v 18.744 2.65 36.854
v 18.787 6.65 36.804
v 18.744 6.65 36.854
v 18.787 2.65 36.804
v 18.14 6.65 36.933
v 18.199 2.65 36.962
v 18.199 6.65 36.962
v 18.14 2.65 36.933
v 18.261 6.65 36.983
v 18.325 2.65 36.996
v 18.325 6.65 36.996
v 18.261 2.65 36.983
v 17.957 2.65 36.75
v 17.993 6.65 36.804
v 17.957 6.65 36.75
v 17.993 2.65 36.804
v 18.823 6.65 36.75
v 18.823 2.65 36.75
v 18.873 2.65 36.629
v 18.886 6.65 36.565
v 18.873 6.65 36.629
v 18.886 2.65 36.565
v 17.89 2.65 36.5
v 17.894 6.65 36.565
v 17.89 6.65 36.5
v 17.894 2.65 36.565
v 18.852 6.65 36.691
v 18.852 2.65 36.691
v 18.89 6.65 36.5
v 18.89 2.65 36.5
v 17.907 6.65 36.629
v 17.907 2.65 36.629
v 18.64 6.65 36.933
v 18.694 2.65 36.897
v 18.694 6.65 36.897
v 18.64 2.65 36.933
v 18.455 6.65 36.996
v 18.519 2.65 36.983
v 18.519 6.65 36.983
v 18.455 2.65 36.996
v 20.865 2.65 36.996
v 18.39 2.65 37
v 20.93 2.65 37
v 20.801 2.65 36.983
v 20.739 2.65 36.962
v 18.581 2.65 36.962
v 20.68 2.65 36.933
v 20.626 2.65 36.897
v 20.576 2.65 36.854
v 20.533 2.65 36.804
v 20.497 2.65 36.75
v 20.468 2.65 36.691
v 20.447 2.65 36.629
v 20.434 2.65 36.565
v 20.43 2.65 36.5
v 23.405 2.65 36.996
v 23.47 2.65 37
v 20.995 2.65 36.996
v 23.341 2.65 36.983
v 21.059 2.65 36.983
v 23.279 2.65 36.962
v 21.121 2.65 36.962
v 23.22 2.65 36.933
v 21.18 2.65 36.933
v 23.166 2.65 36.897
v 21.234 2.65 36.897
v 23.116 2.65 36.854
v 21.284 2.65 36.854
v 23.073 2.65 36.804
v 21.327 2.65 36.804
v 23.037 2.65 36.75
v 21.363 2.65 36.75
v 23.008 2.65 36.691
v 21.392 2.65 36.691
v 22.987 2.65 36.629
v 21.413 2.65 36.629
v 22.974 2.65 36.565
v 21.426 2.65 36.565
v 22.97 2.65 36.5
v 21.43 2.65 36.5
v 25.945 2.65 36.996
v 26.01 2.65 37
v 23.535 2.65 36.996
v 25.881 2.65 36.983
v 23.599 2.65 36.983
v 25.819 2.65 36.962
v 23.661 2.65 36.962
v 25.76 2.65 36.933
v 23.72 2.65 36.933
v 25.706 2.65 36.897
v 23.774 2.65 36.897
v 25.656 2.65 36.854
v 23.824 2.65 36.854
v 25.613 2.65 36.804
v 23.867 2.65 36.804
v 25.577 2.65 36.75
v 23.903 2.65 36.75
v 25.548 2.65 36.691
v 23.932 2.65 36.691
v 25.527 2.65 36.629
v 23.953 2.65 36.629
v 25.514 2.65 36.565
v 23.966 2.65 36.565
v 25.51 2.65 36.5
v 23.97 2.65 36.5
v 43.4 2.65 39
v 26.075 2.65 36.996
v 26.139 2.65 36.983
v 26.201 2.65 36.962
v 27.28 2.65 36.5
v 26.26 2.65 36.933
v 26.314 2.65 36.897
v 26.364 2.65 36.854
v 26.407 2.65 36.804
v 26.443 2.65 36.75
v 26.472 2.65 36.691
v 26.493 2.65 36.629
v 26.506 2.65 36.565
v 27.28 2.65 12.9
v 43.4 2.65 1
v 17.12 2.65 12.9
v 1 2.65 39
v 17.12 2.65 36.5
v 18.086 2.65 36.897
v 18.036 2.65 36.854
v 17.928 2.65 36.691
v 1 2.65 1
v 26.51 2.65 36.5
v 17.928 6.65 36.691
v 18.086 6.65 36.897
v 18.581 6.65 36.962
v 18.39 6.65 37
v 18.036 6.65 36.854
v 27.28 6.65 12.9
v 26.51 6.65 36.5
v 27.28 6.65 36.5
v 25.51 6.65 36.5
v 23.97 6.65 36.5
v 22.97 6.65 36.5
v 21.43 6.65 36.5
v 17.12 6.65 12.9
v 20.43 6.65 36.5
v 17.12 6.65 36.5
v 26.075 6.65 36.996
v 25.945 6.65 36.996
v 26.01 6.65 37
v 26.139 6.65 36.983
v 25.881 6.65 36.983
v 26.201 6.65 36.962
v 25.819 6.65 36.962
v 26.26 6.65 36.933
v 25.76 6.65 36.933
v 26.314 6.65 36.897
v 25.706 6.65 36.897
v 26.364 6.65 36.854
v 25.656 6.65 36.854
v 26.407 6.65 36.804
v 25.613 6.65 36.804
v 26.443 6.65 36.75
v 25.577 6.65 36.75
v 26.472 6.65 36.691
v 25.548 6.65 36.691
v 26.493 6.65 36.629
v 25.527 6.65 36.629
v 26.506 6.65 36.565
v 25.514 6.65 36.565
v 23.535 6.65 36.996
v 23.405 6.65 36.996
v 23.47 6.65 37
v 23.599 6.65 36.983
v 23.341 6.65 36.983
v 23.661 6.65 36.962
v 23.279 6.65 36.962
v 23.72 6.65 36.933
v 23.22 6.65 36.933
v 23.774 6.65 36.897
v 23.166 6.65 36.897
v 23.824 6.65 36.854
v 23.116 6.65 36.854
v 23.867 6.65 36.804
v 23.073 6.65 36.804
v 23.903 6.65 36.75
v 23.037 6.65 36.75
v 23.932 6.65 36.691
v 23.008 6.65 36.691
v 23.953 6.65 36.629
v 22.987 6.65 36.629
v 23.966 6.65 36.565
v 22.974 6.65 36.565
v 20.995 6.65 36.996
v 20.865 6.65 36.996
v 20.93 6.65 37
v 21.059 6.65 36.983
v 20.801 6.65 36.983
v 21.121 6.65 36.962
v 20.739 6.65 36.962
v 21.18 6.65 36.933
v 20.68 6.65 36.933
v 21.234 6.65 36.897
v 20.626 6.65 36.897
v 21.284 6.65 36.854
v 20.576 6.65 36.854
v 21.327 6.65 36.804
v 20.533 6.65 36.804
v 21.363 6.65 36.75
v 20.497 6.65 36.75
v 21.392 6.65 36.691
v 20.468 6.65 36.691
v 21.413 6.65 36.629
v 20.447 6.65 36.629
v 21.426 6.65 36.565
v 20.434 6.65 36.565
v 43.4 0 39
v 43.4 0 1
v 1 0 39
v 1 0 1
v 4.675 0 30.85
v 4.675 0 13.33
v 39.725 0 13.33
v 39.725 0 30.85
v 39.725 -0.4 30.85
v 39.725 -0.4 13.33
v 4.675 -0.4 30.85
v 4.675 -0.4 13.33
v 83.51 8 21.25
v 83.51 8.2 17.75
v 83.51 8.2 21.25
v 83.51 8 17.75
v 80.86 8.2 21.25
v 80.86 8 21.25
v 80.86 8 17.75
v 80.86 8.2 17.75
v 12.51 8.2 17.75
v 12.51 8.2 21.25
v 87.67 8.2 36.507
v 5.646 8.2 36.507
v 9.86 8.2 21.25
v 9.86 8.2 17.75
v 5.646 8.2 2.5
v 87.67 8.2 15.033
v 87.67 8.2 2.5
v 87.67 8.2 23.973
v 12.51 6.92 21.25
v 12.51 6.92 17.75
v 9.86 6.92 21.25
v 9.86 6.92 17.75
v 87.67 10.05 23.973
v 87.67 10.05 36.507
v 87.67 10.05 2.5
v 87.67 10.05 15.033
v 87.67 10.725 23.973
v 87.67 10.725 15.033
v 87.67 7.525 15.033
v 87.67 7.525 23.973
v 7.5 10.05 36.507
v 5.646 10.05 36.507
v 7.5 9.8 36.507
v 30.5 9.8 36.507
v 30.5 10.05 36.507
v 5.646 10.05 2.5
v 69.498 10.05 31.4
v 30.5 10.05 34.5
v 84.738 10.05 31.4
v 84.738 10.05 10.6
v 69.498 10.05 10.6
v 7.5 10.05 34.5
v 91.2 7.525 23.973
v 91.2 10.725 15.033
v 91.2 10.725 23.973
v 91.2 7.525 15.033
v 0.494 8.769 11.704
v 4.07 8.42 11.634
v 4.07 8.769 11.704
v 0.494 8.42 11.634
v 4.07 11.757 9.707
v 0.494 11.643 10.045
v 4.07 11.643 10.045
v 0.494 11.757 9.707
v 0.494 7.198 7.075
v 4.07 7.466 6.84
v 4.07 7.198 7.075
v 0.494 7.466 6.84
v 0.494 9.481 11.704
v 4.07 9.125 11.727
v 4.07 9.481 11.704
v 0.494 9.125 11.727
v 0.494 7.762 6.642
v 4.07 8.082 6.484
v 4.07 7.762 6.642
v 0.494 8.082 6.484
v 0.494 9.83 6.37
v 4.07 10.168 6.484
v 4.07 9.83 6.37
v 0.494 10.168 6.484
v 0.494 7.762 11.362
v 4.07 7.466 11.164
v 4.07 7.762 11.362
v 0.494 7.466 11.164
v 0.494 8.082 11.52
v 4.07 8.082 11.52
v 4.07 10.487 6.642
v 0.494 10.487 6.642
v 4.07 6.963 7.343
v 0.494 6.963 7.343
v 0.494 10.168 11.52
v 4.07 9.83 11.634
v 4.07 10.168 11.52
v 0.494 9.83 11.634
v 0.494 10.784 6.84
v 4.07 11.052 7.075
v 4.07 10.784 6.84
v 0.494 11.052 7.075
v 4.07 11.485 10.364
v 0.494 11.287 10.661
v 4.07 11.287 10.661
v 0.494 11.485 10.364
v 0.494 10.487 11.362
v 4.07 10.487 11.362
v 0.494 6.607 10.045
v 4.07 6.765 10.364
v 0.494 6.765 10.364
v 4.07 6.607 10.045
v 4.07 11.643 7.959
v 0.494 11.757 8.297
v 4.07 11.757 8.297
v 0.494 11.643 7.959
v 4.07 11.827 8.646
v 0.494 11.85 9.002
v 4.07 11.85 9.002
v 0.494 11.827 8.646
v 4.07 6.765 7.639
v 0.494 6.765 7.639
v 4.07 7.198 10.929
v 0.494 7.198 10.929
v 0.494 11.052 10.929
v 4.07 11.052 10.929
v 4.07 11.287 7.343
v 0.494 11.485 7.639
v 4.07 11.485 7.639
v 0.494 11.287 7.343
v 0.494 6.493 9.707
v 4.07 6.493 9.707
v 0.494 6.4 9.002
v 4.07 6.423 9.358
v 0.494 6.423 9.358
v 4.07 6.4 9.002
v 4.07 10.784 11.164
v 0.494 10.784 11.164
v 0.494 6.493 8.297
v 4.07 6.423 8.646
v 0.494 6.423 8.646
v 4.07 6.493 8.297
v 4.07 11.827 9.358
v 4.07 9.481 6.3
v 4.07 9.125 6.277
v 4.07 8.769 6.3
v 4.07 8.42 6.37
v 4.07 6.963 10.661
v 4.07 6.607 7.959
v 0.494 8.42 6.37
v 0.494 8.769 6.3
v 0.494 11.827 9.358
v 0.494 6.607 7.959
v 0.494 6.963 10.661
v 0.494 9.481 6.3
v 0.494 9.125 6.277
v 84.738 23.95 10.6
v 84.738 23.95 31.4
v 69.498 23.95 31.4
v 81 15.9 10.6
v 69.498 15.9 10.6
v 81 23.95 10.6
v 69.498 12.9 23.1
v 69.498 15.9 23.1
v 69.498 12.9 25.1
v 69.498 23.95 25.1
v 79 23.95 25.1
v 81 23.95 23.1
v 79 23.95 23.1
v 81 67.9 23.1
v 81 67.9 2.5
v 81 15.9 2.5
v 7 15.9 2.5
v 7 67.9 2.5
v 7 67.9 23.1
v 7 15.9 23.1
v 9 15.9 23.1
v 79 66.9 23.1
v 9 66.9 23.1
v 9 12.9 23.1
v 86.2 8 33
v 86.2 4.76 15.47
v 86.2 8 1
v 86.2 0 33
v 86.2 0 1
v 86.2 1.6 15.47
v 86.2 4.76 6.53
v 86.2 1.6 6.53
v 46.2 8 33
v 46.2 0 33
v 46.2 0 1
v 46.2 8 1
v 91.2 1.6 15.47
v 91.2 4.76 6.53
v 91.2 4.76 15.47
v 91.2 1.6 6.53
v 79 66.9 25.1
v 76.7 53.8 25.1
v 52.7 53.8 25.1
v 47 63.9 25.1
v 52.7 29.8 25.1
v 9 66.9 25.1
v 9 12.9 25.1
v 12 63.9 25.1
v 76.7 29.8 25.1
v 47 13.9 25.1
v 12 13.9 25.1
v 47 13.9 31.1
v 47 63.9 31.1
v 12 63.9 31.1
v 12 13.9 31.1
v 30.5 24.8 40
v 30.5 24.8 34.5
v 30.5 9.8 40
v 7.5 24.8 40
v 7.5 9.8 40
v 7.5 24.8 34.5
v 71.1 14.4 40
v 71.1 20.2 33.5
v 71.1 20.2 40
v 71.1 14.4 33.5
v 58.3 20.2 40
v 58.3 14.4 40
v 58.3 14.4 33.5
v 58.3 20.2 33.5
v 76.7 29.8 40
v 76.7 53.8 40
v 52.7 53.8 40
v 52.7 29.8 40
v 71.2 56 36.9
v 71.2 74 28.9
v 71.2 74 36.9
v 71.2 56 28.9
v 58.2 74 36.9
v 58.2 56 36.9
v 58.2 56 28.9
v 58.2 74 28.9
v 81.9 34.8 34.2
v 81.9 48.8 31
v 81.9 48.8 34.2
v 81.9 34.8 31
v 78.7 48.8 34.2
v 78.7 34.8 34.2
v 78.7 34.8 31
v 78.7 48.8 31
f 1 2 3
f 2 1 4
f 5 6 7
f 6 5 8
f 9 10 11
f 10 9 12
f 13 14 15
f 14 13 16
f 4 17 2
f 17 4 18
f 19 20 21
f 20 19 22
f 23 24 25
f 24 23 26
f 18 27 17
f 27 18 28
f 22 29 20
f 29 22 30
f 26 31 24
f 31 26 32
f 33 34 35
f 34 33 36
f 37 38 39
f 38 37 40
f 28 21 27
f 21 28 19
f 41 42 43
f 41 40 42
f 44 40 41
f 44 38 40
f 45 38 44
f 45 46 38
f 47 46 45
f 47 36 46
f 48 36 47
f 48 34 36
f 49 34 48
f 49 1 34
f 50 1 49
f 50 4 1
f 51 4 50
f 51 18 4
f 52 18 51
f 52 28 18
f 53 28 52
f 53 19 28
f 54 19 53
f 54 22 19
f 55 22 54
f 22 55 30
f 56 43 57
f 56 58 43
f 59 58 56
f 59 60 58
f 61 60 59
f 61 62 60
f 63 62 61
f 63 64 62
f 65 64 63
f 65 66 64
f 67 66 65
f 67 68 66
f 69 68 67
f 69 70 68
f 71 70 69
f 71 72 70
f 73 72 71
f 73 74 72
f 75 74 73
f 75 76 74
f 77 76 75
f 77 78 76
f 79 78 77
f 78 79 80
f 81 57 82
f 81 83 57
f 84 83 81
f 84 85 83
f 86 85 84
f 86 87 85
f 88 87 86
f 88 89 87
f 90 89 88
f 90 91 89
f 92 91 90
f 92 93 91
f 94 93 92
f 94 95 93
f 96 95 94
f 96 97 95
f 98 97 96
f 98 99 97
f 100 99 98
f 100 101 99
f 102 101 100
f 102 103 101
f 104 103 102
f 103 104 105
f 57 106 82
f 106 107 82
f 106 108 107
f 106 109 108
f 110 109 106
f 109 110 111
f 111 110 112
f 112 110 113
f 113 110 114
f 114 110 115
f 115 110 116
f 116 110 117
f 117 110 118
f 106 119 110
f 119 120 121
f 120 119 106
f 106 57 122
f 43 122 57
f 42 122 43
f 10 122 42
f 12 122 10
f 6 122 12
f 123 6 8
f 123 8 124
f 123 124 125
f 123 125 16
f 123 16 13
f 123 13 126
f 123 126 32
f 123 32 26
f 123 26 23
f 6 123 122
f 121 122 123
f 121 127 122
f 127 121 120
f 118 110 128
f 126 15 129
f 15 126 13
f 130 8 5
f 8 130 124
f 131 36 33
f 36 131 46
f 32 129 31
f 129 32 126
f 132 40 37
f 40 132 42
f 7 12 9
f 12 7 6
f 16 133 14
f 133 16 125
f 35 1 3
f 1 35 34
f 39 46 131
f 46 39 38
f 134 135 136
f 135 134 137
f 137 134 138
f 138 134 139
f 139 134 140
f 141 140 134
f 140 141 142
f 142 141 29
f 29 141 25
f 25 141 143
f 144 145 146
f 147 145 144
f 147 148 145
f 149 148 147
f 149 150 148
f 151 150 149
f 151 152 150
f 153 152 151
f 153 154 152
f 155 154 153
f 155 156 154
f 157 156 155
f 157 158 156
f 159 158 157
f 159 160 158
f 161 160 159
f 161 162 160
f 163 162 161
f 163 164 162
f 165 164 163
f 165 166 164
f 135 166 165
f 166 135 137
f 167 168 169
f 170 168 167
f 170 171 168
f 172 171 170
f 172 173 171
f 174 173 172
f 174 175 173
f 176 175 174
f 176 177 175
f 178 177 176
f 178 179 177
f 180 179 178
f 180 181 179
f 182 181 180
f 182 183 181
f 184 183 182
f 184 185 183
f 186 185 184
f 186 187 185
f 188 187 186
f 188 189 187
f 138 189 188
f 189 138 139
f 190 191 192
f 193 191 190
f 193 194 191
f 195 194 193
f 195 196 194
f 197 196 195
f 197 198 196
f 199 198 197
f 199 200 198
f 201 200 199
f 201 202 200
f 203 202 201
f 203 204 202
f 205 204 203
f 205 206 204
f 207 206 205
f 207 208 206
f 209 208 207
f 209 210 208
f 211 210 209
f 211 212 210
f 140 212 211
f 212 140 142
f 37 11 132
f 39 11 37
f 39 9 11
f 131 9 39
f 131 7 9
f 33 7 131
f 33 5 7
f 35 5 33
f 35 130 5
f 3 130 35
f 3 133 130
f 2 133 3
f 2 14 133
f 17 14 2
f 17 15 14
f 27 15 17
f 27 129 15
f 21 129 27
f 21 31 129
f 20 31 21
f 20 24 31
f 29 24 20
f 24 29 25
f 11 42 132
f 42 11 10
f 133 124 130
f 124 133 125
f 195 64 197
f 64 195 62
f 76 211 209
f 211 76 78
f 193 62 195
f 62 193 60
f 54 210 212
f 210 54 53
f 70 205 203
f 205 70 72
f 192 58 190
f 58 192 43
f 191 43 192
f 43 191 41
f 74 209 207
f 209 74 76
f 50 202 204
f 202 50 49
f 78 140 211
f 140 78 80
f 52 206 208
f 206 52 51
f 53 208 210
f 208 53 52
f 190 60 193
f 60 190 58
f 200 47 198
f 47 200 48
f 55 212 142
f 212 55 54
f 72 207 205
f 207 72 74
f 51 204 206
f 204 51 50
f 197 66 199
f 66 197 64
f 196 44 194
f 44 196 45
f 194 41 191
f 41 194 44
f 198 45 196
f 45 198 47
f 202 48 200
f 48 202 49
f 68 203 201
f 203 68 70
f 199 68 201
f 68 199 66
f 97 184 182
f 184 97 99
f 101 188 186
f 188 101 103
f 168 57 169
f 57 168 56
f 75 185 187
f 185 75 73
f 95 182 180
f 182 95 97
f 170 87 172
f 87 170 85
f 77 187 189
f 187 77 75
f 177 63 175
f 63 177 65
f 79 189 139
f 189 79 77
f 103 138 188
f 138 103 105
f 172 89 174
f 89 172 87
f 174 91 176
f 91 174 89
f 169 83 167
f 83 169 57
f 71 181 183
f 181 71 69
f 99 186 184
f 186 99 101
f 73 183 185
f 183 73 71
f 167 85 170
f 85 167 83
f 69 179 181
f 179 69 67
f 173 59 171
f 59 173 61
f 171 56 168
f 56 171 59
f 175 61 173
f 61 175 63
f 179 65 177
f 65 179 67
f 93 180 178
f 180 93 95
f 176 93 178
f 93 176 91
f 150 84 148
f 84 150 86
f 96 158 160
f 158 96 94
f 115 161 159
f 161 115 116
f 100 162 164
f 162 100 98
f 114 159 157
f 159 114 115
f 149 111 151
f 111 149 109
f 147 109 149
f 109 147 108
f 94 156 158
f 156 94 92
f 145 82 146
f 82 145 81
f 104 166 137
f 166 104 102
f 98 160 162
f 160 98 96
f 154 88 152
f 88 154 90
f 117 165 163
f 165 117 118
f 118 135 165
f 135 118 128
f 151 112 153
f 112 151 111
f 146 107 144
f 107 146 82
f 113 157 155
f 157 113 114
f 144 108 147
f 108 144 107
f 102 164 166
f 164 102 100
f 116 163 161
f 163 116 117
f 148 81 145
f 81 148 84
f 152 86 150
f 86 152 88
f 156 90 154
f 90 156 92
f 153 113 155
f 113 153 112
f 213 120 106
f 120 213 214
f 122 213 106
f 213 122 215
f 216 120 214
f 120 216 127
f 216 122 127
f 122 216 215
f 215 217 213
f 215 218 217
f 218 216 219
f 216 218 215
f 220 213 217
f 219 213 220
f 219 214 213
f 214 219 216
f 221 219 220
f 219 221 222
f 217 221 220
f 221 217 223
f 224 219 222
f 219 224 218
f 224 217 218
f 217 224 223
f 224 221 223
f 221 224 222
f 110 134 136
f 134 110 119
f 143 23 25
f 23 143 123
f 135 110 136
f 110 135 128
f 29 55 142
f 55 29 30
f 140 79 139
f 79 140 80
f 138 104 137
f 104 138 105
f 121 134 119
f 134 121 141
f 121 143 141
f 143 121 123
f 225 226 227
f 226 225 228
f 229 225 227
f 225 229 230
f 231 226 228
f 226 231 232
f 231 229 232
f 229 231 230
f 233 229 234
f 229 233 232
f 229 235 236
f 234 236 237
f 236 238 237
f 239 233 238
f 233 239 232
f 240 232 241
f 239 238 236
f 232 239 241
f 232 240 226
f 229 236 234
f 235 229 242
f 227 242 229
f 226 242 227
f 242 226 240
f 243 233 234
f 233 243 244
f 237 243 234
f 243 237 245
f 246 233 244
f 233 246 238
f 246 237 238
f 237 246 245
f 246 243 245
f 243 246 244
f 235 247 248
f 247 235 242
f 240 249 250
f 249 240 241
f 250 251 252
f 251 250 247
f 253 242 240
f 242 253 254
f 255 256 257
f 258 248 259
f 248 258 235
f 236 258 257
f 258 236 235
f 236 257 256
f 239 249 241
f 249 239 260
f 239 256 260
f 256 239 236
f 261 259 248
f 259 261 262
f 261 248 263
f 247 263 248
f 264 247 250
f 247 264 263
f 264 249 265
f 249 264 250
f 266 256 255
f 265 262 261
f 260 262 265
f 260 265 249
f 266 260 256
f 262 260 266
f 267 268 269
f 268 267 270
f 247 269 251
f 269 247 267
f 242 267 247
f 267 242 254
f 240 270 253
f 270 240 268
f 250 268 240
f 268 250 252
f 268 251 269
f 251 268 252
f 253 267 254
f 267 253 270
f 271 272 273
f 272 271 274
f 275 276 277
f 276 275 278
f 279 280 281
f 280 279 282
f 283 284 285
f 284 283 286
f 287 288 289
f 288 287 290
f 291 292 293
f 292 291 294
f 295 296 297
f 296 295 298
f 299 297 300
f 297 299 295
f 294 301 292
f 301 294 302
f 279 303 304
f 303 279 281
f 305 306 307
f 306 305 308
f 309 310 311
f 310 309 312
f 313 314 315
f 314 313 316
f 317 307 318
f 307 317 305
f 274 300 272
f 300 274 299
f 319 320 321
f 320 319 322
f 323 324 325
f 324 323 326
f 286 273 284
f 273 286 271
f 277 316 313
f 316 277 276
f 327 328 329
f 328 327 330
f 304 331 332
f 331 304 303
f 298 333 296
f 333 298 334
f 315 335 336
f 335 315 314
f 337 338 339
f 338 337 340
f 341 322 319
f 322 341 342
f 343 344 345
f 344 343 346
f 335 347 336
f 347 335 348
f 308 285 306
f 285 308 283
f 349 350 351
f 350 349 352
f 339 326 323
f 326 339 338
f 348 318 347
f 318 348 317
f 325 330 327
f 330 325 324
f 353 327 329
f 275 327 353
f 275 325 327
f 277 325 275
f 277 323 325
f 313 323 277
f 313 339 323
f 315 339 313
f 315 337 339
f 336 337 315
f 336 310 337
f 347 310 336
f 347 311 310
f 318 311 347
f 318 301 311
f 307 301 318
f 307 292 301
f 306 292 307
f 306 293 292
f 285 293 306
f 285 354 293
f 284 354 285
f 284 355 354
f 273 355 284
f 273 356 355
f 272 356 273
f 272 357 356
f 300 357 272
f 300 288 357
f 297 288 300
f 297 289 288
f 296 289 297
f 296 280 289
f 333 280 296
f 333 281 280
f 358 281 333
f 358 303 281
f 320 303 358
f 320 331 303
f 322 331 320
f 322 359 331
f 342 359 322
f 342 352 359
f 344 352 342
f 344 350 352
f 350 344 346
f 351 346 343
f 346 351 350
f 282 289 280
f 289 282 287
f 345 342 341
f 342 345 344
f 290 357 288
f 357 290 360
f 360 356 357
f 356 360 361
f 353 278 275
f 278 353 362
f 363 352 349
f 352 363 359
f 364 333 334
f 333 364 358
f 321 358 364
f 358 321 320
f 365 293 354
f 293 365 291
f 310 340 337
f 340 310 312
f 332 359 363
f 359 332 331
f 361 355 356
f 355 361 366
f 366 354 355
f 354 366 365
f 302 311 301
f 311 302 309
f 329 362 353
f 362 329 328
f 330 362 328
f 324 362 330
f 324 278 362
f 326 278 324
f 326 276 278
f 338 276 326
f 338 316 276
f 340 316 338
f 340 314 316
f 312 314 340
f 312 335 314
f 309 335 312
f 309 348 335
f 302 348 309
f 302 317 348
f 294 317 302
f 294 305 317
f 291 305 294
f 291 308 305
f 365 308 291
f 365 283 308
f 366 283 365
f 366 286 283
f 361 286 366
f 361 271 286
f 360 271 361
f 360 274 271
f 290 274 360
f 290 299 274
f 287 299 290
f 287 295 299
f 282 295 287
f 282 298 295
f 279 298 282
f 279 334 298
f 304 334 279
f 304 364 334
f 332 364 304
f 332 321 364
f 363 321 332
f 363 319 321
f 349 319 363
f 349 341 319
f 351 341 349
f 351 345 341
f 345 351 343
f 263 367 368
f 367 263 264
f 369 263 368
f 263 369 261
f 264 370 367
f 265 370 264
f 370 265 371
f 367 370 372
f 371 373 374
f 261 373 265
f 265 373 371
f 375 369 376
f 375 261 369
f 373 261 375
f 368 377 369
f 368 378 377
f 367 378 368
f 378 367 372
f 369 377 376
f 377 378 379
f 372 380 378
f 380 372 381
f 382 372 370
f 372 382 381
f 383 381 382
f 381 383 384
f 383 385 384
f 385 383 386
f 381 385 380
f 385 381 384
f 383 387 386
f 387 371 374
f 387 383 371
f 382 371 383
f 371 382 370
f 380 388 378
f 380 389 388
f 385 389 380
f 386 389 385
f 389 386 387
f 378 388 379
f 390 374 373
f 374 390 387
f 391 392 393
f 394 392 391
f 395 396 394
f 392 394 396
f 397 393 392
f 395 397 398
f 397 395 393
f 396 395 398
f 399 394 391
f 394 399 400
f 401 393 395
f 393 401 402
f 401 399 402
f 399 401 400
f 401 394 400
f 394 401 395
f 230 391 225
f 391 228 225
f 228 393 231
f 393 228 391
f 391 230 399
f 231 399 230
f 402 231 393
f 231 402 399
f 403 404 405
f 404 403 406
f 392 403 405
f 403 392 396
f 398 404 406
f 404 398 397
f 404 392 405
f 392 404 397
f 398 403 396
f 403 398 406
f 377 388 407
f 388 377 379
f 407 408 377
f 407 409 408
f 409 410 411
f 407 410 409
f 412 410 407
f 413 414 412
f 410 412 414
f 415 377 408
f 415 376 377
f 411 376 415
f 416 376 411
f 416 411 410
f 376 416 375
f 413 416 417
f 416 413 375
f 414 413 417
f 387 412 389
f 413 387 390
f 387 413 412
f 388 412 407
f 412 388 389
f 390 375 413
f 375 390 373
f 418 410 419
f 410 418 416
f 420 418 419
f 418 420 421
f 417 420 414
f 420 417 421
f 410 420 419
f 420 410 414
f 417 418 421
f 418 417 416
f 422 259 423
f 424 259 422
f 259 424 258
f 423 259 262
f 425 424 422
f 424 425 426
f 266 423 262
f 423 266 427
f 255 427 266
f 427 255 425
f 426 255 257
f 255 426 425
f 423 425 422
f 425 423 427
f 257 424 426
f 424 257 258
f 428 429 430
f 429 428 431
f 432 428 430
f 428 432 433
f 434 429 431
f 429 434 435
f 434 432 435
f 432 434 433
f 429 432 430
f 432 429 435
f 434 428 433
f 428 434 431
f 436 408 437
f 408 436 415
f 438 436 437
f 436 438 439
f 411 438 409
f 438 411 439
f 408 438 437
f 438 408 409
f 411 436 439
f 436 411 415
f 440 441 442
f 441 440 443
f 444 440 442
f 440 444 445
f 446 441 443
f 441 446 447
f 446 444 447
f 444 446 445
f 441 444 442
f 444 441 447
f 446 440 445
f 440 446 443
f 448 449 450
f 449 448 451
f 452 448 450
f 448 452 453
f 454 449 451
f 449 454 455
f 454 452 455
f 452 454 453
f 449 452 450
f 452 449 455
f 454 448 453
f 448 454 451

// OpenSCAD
// ============================================================
// 筐体 v6 — 配置（ブロック）
//   方針（ユーザー 2026-09-12）: 全リニューアル。部品をブロックとして置き直す所からやる。
//   数字と向きの正は docs/CASE-V6-PLAN.md。v5 のファイルは読まない（座標を写さない）。
//   この版はまだ**実測の直方体を置いただけ**で、皮・柱・口・線・締結は無い。当たり検査も無い。
//
//   実行:
//     "C:/Program Files/OpenSCAD (Nightly)/openscad.exe" --backend=manifold -o x.png -D "part=\"look\"" hardware/case_v6.scad
//
//   part の値:
//     look   … 中身ぜんぶ（ブロック 4 つ＋段＋電池＋操作部）。内寸の箱は輪郭だけ
//     blocks … ブロック 4 つだけ（OLED・ReSpeaker・ハブ・電源板）
//     front  … 前から見た絵（顔の窓と充電の口の位置を見る）
//     side   … 左半分の側面（前から後ろへの断面の代わり。高さの鎖を見る）
//     （語を足すときはここへ書く。既にある語の意味は変えない）
// ============================================================
part = "look";

use <parts/parts.scad>
$fn = 48;

// ---- 箱の中の座標 ----
//   X 0 = 左の壁の内面 ／ Y 0 = 前の壁の内面 ／ Z 0 = 床の上面
//   +X 右（XIAO の USB-C 側）・+Y 後ろ（ハッチ側）・+Z 上（天面）
IN_X = 88.0;
IN_Y = 74.0;
IN_Z = 40.0;

WALL = 2.0;
PORT_BACK = 0.8;   // 口の面を壁の外面の何 mm 裏に置くか。🔒 1.6 裏は実機で挿さらなかった（2026-09-11）

// ---- OLED HS154L03W2C01（📄 hardware/ref/oled_hs154l03w2c01/）----
//   42.40 が横・38.00 が縦。ガラス面が前。🔒 顔は左（ユーザー 2026-09-12）
OLED_L  = 42.40;
OLED_H  = 38.00;
OLED_T  =  2.65;
OLED_X  =  1.0;
OLED_Z  =  1.0;
OLED_AA = [35.05, 17.52];
OLED_AA_EDGE = 8.15;   // 📄 端子側の縁から AA まで。反対側は 12.33（FPC の折り返し）
OLED_PIN_EDGE = 2.50;  // 📄 端子の列から、その縁まで
OLED_PIN_N = 4;
// ⚠ 私が置いた前提①: 端子を**上**の縁へ（窓が高くなる側。下にすると窓は Z 9.2〜26.7）
OLED_PIN_TOP = true;
// ⚠ 私が置いた前提③: L 字の 4 ピンヘッダ。ピンは列と直交する向きに曲がるので**上下（Z）へ出る**。
//    端子が上なので下向きに出す。縁の外へ ピン 6 ＋ ハウジング 14 ＋ 逃げ 3.6 = 23.6（parts.scad の as5600(ra=true) と同じ数え方）
OLED_RA_OUT = 23.6;
OLED_RA_T   =  4.0;   // 板の裏から出る量（L 字にするとここが 17 → 4 になる）

// ---- ReSpeaker Lite（📄 docs/RESPEAKER-LITE.md 5.6 公式 CAD）----
//   立てる。マイク面が前・XIAO 面が後ろ。XIAO は箱の +X 側に来る
RSP_L = 82.024;
RSP_H = 34.007;
RSP_T =  1.85;
RSP_Z =  2.5;                                   // 半田面の逃げ
XIAO_USB_OUT = 1.53;                            // 📄 板の端からの張り出し
RSP_X = IN_X + WALL - PORT_BACK - XIAO_USB_OUT - RSP_L;   // 右端の口を壁に合わせて左端が決まる
RSP_Y = 8.2;                                    // マイク面の Y
JACK_OUT = 1.576;                               // 📄 3.5mm ジャックの筒が左端から出る量
HDR_OUT  = 13.9;                                // ✅ XIAO 面のヘッダ＋線（ユーザー 2026-08-24）

// ---- ハブ基板（hardware/parts/hub_board_parts.scad）----
HUB_L = 74.0;
HUB_W = 52.0;
HUB_T =  1.6;
HUB_X = (IN_X - HUB_L) / 2;
HUB_Y = 15.9;
HUB_Z =  2.5;
HUB_PLUG_TOP = 23.1;   // 床から、口の曲がりの頭まで（樹脂 2.5 ＋ ハウジング 14 ＋ 曲がり 3.0）

// ---- 電源板（docs/POWER.md 案③）----
//   前の壁に立てる。部品面が後ろ。充電の USB-C は右の縁で、板から 3.0 出る
PWR_L = 40.0;
PWR_H = 32.0;
PWR_T =  1.6;
PWR_PARTS_T = 6.4;
PWR_Z = 1.0;
USBC_OUT = 3.0;
PWR_X = IN_X + WALL - PORT_BACK - USBC_OUT - PWR_L;
USBC_FROM_END = 10.0;   // 📄 32 の縁の端から、口の芯まで
USBC_W = 8.94;
USBC_T = 3.16;

// ---- 段と電池 ----
TRAY_T = 2.0;
TRAY_Z = HUB_PLUG_TOP;
BAT_X = 12.0;
BAT_Y = 13.9;
BAT_Z = TRAY_Z + TRAY_T;

// ---- 天板から下がる操作部（🔒 ユーザー 2026-09-08 の席）----
ROW_Y  = 17.3;
ROW_RX = 64.7;
SPK_X  = 19.0;
KNOB_Y = 41.8;
TGL_FROM_TOP = 7.1;
TOP_T = 2.5;
// つまみの AS5600 のヘッダ。false = 直立て ／ true = L 字（ユーザー 2026-09-12 の提案）
KNOB_HDR_RA = false;
// 天板の外面から下への鎖（knob_v5 の Z_PCB_BOT と plug.scad）:
//   基板の裏 19.7 ＋ 直立てなら 樹脂 2.5 ＋ ハウジング 14 ＝ 16.5 ／ L 字なら樹脂まわり 約 4
//   🔴 22.4（バスタブ 2 の板の裏）はヘッダを含まない。2026-09-12 にここを 22.4 で描いて 11.3 浅くしていた
KNOB_PCB_BOT = 19.7;
KNOB_HDR_DEEP = KNOB_HDR_RA ? 4.0 : 2.5 + 14.0;
KNOB_DEEP = KNOB_PCB_BOT + KNOB_HDR_DEEP - TOP_T;   // 内側の天井から下への深さ
KNOB_RA_OUT = 23.6;   // L 字のとき基板の縁の外へ出る量（片側・ピン 6 ＋ ハウジング 14 ＋ 逃げ 3.6）
AS5600_PCB = 23.0;

// ============================================================
module box_outline() {
    difference() {
        cube([IN_X, IN_Y, IN_Z]);
        translate([1, 1, 1]) cube([IN_X - 2, IN_Y - 2, IN_Z - 2]);
    }
}

module oled_block() {
    color("#7f77dd") translate([OLED_X, 0, OLED_Z]) cube([OLED_L, OLED_T, OLED_H]);
    // 窓（AA）。42.40 の方向は中央・38.00 の方向は端子側の縁から OLED_AA_EDGE
    aa_x = OLED_X + (OLED_L - OLED_AA[0]) / 2;
    aa_z = OLED_PIN_TOP ? OLED_Z + OLED_H - OLED_AA_EDGE - OLED_AA[1]
                        : OLED_Z + OLED_AA_EDGE;
    color("#2c2c2a") translate([aa_x, -0.4, aa_z]) cube([OLED_AA[0], 0.4, OLED_AA[1]]);
    // 端子 4 本（φ1.0・2.54 ピッチ・列は 42.40 の方向の中央）と、L 字の包絡
    pin_z = OLED_PIN_TOP ? OLED_Z + OLED_H - OLED_PIN_EDGE : OLED_Z + OLED_PIN_EDGE;
    span  = (OLED_PIN_N - 1) * 2.54;
    pin_x = OLED_X + OLED_L / 2 - span / 2;
    for (i = [0 : OLED_PIN_N - 1])
        color("#bba") translate([pin_x + i * 2.54, OLED_T, pin_z]) rotate([-90, 0, 0]) cylinder(d = 1.0, h = OLED_RA_T);
    ra_z0 = OLED_PIN_TOP ? pin_z - OLED_RA_OUT : pin_z;
    color("#85b7eb", 0.45) translate([pin_x - 1.27, OLED_T, ra_z0]) cube([span + 2.54, OLED_RA_T, OLED_RA_OUT]);
}

module respeaker_block() {
    color("#1d9e75") translate([RSP_X, RSP_Y, RSP_Z]) cube([RSP_L, RSP_T, RSP_H]);
    // 右端の XIAO の USB-C（壁を貫く）と、左端の 3.5mm ジャックの筒
    color("#85b7eb") translate([RSP_X + RSP_L, RSP_Y + RSP_T / 2 - 1.6, RSP_Z + RSP_H / 2 - 4.47])
        cube([XIAO_USB_OUT + WALL, 3.2, 8.94]);
    color("#85b7eb") translate([RSP_X - JACK_OUT, RSP_Y + RSP_T / 2, RSP_Z + 6.502])
        rotate([0, -90, 0]) cylinder(d = 5.45, h = JACK_OUT + WALL);
    // XIAO 面のヘッダ＋線の層（📄 左から 2.932〜18.172 のパッド列。マイク面を前にすると箱の +X 側へ回る）
    hx0 = RSP_X + RSP_L - 18.172;
    color("#9fe1cb", 0.45) translate([hx0, RSP_Y + RSP_T, RSP_Z + 8.1]) cube([15.24, HDR_OUT, 20.8]);
    // 🔒 マイク 2 個（📄 公式 CAD: U4 左から 4.16〜6.81・U5 左から 75.16〜77.81・どちらも下から 15.25〜18.75）。
    //    塞いだら音が死ぬ場所。マイク面を前にすると「左から」は箱の +X 側から数える向きになる
    for (d = [[4.16, 6.81], [75.16, 77.81]])
        color("#e24b4a") translate([RSP_X + RSP_L - d[1], RSP_Y - 1.28, RSP_Z + 15.25])
            cube([d[1] - d[0], 1.28, 3.5]);
}

module hub_block() {
    color("#d85a30") translate([HUB_X, HUB_Y, HUB_Z]) cube([HUB_L, HUB_W, HUB_T]);
    // 口の層（口 8 つは全部上向き。曲がりの頭まで床から HUB_PLUG_TOP）
    color("#f0997b", 0.35) translate([HUB_X, HUB_Y, HUB_Z + HUB_T])
        cube([HUB_L, HUB_W, HUB_PLUG_TOP - HUB_Z - HUB_T]);
}

module power_block() {
    color("#993c1d") translate([PWR_X, 0, PWR_Z]) cube([PWR_L, PWR_T, PWR_H]);
    color("#f0997b", 0.35) translate([PWR_X, PWR_T, PWR_Z]) cube([PWR_L, PWR_PARTS_T, PWR_H]);
    // 充電の USB-C（右の縁・32 の縁の下の端から 10・板から USBC_OUT 出て壁を貫く）
    color("#378add") translate([PWR_X + PWR_L, PWR_T, PWR_Z + USBC_FROM_END - USBC_W / 2])
        cube([USBC_OUT + WALL, USBC_T, USBC_W]);
}

module tray_and_battery() {
    color("#b4b2a9", 0.5) translate([HUB_X + 2, BAT_Y - 1, TRAY_Z]) cube([HUB_L - 4, 54, TRAY_T]);
    color("#ef9f27") translate([BAT_X, BAT_Y, BAT_Z]) cube([lipo_size()[1], lipo_size()[0], lipo_size()[2]]);
}

module deck_parts() {
    // スピーカー（天板の裏・振動面が上）
    color("#534ab7") translate([SPK_X - 11.5, ROW_Y - 7.5, IN_Z - 5.5]) cube([23, 15, 5.5]);
    // 会話ボタン（天板・押しは縦）
    color("#534ab7") translate([ROW_RX - 6.4, ROW_Y - 2.9, IN_Z - 6.5]) cube([12.8, 5.8, 6.5]);
    // つまみの柱（天板から下へ KNOB_DEEP。AS5600 の板 23 角＋逃げ）
    color("#afa9ec", 0.6) translate([ROW_RX - 12, KNOB_Y - 12, IN_Z - KNOB_DEEP]) cube([24, 24, KNOB_DEEP]);
    // トグル MTS-102（ハッチ・軸は水平・後ろ向き。内側に mts102_deep()）
    color("#26215c") translate([ROW_RX - mts102_w() / 2, IN_Y - mts102_deep(), IN_Z - TGL_FROM_TOP - mts102_d() / 2])
        cube([mts102_w(), mts102_deep(), mts102_d()]);
    // リードスイッチ（つまみの脇・軸は水平）
    color("#26215c") translate([ROW_RX + 14, KNOB_Y - 7, IN_Z - 9]) cube([3.2, 14, 3.2]);
}

module blocks_only() {
    oled_block();
    respeaker_block();
    hub_block();
    power_block();
}

if (part == "blocks") {
    blocks_only();
    %box_outline();
} else if (part == "look" || part == "front" || part == "side") {
    blocks_only();
    tray_and_battery();
    deck_parts();
    %box_outline();
} else {
    echo(str("🔴 part の値が不明: ", part));
}

echo(str("内寸 ", IN_X, " x ", IN_Y, " x ", IN_Z, " = ",
         IN_X * IN_Y * IN_Z / 1000, "cm3"));
echo(str("ReSpeaker 左端 ", RSP_X, " / XIAO の口の面 ", RSP_X + RSP_L + XIAO_USB_OUT,
         " / ジャックの筒の先 ", RSP_X - JACK_OUT));
echo(str("電源板 X ", PWR_X, "〜", PWR_X + PWR_L, " / 充電の口の面 ", PWR_X + PWR_L + USBC_OUT));
echo(str("顔と電源板のすき間 ", PWR_X - (OLED_X + OLED_L)));
echo(str("窓 X ", OLED_X + (OLED_L - OLED_AA[0]) / 2, "〜", OLED_X + (OLED_L + OLED_AA[0]) / 2,
         " / Z ", OLED_PIN_TOP ? OLED_Z + OLED_H - OLED_AA_EDGE - OLED_AA[1] : OLED_Z + OLED_AA_EDGE,
         "〜", OLED_PIN_TOP ? OLED_Z + OLED_H - OLED_AA_EDGE : OLED_Z + OLED_AA_EDGE + OLED_AA[1]));
